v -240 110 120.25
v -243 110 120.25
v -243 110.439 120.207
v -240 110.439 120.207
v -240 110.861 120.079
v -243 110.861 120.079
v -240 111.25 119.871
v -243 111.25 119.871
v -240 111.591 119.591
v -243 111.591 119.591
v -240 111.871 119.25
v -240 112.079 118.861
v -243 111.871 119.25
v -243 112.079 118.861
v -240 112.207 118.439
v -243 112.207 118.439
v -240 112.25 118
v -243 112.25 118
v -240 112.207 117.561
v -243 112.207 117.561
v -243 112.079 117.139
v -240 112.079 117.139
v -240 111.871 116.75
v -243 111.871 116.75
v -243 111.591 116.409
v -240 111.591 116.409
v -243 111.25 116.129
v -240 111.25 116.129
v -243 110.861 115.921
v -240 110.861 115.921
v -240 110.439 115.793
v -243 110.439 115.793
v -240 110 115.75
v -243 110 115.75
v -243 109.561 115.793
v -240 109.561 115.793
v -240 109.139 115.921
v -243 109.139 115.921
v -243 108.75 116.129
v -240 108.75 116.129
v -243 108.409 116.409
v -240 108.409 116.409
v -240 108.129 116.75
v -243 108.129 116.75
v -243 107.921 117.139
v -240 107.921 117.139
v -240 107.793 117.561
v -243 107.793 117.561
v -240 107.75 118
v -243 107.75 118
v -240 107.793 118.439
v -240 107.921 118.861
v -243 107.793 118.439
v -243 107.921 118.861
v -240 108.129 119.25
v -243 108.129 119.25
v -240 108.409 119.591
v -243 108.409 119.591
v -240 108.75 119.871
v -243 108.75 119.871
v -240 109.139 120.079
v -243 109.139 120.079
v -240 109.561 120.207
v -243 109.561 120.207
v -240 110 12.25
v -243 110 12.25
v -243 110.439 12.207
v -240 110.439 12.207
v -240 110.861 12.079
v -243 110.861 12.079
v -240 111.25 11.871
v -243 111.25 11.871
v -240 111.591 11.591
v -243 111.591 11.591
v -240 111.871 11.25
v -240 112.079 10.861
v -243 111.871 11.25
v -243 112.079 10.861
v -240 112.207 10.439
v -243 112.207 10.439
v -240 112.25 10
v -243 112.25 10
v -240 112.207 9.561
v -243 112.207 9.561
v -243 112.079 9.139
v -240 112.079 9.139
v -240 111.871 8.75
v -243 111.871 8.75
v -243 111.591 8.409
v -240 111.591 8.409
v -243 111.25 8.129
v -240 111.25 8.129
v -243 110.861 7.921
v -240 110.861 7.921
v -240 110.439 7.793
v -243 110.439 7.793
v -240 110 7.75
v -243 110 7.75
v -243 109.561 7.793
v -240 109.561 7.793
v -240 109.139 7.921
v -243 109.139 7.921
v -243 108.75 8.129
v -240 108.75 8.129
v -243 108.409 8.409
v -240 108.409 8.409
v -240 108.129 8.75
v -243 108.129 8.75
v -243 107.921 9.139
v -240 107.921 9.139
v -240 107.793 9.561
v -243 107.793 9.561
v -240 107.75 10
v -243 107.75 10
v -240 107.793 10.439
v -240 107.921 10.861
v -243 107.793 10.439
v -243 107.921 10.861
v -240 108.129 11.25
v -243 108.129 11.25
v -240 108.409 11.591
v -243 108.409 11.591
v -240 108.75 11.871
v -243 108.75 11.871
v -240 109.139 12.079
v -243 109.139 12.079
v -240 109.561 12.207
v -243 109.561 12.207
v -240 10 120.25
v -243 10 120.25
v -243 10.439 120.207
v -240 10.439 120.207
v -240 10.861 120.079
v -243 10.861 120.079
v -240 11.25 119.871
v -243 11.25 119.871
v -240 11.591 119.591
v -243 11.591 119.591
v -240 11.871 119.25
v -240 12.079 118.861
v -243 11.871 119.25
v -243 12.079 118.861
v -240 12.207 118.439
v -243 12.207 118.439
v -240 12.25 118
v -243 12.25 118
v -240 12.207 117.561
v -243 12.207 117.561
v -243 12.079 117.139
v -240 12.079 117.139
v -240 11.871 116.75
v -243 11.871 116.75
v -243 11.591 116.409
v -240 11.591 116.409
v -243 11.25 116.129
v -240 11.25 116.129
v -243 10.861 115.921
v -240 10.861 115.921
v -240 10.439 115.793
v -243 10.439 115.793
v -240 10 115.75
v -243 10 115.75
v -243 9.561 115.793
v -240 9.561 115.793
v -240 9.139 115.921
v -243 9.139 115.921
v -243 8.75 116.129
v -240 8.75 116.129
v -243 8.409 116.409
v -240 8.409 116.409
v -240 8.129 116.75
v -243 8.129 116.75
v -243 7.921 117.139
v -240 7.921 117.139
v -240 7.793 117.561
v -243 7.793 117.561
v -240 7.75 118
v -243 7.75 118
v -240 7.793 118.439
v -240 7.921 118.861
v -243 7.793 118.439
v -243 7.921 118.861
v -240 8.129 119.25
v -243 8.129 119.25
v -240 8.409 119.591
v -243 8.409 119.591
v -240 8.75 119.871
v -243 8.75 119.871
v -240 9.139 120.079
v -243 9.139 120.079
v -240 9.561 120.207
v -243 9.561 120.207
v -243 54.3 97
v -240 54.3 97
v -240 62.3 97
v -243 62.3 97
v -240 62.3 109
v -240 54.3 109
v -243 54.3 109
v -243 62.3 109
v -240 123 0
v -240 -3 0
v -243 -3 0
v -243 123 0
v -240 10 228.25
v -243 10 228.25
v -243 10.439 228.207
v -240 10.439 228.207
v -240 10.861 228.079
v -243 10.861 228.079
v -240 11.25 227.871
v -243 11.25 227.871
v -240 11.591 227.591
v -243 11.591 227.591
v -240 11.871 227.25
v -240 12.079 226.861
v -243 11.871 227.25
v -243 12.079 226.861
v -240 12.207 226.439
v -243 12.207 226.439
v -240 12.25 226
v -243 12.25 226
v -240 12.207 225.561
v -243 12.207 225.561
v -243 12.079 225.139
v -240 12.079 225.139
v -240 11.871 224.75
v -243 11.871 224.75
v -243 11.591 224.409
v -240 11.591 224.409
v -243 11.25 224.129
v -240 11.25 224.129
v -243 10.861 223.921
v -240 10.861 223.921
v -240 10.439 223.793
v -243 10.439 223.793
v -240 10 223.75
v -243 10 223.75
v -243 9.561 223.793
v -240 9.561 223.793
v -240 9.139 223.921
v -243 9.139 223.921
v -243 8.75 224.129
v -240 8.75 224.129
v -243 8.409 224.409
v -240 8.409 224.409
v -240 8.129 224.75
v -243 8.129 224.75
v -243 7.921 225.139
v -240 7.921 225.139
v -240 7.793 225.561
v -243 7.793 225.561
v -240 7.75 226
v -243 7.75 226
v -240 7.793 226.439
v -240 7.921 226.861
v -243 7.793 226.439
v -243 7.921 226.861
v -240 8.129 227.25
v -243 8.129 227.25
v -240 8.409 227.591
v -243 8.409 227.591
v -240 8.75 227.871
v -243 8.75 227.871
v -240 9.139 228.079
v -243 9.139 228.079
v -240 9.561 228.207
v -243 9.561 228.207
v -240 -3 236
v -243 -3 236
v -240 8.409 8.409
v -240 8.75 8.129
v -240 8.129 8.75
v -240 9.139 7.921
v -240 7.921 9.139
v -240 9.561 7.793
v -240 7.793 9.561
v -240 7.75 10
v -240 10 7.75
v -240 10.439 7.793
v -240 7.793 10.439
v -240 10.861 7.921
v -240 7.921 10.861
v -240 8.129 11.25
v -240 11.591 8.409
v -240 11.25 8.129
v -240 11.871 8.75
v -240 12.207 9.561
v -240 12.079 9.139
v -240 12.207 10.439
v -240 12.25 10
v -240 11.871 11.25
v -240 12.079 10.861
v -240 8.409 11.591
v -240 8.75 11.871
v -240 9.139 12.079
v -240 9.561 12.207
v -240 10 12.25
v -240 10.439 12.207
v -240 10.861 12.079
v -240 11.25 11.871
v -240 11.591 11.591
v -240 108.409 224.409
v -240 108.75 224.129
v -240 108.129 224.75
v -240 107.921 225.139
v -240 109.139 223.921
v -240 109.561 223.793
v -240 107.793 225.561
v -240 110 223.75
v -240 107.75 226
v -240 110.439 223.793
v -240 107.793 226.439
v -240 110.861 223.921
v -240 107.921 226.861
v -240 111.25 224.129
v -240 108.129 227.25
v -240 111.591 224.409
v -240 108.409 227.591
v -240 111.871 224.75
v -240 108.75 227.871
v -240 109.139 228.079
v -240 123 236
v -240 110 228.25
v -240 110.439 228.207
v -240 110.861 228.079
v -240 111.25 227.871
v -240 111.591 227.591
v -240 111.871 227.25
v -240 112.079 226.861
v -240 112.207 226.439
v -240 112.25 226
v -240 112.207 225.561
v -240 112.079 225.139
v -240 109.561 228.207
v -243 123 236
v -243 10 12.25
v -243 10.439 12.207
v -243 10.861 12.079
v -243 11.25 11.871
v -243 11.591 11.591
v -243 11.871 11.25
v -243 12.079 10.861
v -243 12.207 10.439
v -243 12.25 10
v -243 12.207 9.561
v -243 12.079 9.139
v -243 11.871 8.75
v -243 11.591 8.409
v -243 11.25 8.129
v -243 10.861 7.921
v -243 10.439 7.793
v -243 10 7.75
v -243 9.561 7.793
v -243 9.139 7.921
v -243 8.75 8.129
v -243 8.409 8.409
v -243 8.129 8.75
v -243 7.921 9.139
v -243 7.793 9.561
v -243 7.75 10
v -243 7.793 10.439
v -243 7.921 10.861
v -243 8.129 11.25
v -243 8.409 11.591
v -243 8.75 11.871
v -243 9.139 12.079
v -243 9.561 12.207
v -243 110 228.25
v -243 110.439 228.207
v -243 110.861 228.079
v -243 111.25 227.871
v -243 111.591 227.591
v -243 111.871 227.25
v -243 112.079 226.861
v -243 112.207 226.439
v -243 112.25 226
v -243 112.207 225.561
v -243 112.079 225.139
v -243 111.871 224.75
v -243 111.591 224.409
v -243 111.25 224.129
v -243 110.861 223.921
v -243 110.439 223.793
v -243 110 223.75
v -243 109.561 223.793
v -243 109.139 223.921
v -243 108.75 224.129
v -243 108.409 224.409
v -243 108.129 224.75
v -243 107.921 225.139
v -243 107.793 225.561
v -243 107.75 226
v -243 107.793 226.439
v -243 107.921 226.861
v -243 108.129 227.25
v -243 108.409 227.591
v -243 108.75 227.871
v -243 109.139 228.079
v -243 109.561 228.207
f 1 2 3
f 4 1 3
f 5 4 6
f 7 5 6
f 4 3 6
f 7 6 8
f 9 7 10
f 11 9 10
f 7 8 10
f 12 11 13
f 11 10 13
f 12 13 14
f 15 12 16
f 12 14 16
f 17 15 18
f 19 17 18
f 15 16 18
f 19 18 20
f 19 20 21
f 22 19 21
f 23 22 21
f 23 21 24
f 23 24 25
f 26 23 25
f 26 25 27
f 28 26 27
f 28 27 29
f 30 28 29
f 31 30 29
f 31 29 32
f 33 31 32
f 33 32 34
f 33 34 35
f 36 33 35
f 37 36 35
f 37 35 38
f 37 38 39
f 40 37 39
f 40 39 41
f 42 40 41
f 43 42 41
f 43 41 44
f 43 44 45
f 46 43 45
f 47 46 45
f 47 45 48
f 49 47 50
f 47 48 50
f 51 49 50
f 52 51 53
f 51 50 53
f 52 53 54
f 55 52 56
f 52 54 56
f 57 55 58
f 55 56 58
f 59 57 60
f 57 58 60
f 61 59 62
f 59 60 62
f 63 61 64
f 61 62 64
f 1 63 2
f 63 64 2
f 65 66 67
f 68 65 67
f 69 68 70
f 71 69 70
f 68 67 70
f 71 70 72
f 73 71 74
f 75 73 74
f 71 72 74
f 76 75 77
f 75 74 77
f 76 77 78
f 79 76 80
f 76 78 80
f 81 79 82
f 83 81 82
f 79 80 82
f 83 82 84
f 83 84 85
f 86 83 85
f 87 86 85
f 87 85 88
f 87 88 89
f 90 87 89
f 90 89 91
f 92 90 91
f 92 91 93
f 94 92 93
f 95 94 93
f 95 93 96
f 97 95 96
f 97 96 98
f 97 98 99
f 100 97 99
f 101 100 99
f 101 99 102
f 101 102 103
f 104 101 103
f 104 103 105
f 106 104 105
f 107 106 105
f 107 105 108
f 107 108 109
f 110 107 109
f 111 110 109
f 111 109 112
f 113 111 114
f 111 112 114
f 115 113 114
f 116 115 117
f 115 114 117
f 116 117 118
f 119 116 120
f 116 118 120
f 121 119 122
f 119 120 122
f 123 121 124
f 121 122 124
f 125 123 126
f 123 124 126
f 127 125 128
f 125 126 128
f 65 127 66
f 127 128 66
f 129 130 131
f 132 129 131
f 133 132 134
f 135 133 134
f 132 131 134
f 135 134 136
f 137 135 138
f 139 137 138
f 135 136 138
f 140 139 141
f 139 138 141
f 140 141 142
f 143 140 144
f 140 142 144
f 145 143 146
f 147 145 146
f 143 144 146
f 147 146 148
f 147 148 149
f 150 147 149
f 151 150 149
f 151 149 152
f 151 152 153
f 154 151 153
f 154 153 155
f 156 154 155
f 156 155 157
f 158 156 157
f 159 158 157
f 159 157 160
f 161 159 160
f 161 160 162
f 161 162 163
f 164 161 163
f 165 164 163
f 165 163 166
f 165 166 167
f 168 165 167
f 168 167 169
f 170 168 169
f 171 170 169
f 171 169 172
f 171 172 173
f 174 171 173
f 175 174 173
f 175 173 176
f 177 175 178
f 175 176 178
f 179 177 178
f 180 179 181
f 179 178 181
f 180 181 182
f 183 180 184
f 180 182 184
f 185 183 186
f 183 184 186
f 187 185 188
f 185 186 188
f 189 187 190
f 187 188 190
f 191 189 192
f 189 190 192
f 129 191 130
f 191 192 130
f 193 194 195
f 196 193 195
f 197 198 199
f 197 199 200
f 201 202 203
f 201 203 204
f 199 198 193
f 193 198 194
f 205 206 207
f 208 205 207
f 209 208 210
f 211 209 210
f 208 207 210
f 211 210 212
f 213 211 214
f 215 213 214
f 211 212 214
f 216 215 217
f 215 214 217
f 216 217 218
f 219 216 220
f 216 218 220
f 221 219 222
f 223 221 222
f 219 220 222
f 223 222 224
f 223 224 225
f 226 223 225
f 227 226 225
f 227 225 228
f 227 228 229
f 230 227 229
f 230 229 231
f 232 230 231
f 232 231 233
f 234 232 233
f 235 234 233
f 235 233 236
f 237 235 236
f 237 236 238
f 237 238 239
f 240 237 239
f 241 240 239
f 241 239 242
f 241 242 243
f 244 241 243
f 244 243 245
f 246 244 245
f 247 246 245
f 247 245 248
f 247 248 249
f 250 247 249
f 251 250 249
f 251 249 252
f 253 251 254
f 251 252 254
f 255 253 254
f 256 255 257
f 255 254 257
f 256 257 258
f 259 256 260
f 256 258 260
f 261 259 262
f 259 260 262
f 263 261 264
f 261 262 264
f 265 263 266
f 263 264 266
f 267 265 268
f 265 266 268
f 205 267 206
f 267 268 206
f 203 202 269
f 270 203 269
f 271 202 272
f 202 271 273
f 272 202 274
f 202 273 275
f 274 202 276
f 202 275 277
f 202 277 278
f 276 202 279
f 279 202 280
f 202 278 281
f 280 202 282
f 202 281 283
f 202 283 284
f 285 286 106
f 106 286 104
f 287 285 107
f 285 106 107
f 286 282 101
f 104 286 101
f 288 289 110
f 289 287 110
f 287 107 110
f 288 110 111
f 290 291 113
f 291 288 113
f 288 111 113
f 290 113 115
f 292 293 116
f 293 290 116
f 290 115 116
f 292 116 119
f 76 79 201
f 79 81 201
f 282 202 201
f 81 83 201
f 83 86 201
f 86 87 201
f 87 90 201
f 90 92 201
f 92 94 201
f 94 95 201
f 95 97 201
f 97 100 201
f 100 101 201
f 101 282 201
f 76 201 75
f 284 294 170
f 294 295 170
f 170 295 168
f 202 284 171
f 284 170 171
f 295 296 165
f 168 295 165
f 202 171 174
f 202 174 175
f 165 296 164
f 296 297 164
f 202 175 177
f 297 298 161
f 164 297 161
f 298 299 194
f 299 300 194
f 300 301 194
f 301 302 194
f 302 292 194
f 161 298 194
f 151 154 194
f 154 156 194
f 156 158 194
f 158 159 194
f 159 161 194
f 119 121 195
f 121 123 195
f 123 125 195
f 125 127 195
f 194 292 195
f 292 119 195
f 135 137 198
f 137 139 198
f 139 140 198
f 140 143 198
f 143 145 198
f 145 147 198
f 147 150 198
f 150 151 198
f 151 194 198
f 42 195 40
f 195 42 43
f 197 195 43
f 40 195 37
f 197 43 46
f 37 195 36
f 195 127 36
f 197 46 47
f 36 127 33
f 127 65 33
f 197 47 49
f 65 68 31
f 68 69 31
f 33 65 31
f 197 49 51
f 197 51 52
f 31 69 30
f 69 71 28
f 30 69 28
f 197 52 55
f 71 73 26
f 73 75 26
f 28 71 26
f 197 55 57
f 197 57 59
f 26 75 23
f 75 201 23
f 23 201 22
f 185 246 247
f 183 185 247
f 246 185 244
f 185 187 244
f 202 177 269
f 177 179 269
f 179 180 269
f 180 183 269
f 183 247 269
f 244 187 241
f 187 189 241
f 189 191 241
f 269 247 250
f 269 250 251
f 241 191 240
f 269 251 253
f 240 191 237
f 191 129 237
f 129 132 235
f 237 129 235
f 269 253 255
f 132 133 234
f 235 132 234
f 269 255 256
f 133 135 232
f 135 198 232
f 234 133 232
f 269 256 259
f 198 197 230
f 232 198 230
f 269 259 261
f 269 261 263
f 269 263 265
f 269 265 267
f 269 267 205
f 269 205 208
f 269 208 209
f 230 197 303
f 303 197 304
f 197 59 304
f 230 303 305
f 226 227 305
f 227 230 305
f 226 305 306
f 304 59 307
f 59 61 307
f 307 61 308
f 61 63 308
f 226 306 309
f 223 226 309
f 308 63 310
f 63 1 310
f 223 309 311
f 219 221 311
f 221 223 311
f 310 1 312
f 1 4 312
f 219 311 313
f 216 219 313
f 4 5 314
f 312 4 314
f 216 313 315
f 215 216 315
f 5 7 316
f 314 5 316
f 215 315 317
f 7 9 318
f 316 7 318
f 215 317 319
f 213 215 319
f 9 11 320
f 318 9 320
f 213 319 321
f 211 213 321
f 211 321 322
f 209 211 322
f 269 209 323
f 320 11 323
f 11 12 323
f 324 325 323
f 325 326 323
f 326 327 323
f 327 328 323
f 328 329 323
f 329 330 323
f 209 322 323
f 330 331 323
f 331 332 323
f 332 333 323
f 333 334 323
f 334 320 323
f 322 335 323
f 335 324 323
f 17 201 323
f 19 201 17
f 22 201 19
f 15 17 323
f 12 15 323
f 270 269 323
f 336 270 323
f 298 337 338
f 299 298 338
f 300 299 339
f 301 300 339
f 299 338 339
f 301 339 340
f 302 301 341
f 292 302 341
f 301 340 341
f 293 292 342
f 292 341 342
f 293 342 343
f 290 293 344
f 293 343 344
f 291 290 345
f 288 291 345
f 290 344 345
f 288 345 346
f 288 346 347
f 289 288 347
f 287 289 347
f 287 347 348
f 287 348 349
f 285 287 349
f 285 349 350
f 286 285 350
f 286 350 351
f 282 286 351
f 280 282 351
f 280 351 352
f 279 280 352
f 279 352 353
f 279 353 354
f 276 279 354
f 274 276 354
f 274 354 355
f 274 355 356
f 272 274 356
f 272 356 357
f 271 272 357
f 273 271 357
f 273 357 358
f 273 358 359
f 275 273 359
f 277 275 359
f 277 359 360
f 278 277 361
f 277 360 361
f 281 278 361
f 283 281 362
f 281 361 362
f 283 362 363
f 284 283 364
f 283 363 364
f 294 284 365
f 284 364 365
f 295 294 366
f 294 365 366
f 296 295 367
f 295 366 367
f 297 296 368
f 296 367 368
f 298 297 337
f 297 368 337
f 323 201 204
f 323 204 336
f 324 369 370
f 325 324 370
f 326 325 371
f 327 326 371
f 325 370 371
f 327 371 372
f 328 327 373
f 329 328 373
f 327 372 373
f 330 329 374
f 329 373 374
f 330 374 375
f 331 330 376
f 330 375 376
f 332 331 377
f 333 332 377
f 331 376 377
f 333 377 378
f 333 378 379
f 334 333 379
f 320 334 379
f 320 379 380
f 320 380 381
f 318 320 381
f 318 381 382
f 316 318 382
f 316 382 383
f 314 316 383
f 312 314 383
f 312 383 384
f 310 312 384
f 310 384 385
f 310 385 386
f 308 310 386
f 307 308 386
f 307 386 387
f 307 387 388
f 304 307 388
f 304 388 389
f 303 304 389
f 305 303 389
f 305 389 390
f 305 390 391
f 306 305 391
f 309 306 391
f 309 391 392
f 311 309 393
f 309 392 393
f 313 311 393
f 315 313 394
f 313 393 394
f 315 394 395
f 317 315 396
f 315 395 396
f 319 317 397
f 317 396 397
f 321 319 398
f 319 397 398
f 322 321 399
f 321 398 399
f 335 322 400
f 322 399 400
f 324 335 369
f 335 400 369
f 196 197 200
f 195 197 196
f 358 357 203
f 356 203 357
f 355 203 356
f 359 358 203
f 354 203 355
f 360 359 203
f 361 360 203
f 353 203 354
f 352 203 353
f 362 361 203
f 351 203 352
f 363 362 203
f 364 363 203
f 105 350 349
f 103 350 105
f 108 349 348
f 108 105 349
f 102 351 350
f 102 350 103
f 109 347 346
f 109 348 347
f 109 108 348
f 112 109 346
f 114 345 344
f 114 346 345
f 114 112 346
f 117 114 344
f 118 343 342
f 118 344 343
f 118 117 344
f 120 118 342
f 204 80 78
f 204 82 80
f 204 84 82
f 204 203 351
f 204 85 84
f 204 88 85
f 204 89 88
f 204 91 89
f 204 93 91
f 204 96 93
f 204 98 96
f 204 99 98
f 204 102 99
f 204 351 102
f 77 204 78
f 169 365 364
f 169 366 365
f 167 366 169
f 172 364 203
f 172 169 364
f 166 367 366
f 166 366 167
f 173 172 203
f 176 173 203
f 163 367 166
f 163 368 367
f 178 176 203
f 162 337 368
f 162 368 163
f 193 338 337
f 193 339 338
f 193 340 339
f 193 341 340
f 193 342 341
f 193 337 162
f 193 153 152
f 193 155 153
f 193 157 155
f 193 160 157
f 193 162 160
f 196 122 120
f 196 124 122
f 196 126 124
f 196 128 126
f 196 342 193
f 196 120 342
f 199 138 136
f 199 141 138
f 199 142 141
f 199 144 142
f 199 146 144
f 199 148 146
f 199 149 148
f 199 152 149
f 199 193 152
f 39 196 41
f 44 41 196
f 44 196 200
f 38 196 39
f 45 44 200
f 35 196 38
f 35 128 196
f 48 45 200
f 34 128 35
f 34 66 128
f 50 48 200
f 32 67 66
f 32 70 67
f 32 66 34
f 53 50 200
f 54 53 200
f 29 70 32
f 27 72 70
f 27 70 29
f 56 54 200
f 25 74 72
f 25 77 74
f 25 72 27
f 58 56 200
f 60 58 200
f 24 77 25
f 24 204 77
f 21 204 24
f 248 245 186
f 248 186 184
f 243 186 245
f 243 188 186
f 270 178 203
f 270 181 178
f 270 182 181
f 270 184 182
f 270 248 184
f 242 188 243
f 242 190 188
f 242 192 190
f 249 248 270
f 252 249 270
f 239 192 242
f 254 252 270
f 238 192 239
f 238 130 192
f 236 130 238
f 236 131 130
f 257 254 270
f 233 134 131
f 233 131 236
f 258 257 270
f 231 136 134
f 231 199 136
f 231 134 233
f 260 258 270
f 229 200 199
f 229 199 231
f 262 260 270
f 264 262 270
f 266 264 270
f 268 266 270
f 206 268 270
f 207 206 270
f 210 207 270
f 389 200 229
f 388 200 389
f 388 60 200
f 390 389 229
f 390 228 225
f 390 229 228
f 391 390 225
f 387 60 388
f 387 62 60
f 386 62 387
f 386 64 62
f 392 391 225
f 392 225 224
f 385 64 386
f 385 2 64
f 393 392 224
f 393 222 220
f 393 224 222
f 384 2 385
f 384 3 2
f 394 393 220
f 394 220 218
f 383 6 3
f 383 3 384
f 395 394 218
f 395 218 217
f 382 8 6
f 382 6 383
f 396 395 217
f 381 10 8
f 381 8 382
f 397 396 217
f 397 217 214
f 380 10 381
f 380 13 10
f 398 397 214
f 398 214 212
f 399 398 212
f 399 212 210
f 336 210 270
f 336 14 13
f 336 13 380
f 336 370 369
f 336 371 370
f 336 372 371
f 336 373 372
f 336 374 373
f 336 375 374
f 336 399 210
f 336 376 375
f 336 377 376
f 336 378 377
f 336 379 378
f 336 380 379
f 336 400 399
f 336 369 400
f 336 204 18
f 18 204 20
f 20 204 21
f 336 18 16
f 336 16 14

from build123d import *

# Parameters (mm, degrees)
SKETCH_1_W          = 236
SKETCH_1_H          = 126
EXTRUDE_1_DEPTH     = 3
SKETCH_2_R          = 2.25
CUT_EXTRUDE_1_DEPTH = 4
SKETCH_3_W          = 12
SKETCH_3_H          = 8
CUT_EXTRUDE_2_DEPTH = 4


with BuildPart() as part:
    # Эскиз1 → Бобышка-Вытянуть1 (new body)
    with BuildSketch(Plane.ZY.offset(240)):
        with Locations((118, 60)):
            Rectangle(SKETCH_1_W, SKETCH_1_H)
    extrude(amount=EXTRUDE_1_DEPTH)

    # Эскиз2 → Вырез-Вытянуть1 (cut, through all)
    with BuildSketch(Plane.ZY.offset(243)):
        with Locations((226, 110)):
            Circle(SKETCH_2_R)
        with Locations((118, 110)):
            Circle(SKETCH_2_R)
        with Locations((10, 110)):
            Circle(SKETCH_2_R)
        with Locations((226, 10)):
            Circle(SKETCH_2_R)
        with Locations((118, 10)):
            Circle(SKETCH_2_R)
        with Locations((10, 10)):
            Circle(SKETCH_2_R)
    extrude(amount=-CUT_EXTRUDE_1_DEPTH, mode=Mode.SUBTRACT)

    # Эскиз3 → Вырез-Вытянуть2 (cut, through all)
    with BuildSketch(Plane(origin=(-240, 0, 0), x_dir=(0, 0, -1), z_dir=(1, 0, 0))):
        with Locations((-103, 58.3)):
            Rectangle(SKETCH_3_W, SKETCH_3_H)
    extrude(amount=-CUT_EXTRUDE_2_DEPTH, mode=Mode.SUBTRACT)


solid = part.part
